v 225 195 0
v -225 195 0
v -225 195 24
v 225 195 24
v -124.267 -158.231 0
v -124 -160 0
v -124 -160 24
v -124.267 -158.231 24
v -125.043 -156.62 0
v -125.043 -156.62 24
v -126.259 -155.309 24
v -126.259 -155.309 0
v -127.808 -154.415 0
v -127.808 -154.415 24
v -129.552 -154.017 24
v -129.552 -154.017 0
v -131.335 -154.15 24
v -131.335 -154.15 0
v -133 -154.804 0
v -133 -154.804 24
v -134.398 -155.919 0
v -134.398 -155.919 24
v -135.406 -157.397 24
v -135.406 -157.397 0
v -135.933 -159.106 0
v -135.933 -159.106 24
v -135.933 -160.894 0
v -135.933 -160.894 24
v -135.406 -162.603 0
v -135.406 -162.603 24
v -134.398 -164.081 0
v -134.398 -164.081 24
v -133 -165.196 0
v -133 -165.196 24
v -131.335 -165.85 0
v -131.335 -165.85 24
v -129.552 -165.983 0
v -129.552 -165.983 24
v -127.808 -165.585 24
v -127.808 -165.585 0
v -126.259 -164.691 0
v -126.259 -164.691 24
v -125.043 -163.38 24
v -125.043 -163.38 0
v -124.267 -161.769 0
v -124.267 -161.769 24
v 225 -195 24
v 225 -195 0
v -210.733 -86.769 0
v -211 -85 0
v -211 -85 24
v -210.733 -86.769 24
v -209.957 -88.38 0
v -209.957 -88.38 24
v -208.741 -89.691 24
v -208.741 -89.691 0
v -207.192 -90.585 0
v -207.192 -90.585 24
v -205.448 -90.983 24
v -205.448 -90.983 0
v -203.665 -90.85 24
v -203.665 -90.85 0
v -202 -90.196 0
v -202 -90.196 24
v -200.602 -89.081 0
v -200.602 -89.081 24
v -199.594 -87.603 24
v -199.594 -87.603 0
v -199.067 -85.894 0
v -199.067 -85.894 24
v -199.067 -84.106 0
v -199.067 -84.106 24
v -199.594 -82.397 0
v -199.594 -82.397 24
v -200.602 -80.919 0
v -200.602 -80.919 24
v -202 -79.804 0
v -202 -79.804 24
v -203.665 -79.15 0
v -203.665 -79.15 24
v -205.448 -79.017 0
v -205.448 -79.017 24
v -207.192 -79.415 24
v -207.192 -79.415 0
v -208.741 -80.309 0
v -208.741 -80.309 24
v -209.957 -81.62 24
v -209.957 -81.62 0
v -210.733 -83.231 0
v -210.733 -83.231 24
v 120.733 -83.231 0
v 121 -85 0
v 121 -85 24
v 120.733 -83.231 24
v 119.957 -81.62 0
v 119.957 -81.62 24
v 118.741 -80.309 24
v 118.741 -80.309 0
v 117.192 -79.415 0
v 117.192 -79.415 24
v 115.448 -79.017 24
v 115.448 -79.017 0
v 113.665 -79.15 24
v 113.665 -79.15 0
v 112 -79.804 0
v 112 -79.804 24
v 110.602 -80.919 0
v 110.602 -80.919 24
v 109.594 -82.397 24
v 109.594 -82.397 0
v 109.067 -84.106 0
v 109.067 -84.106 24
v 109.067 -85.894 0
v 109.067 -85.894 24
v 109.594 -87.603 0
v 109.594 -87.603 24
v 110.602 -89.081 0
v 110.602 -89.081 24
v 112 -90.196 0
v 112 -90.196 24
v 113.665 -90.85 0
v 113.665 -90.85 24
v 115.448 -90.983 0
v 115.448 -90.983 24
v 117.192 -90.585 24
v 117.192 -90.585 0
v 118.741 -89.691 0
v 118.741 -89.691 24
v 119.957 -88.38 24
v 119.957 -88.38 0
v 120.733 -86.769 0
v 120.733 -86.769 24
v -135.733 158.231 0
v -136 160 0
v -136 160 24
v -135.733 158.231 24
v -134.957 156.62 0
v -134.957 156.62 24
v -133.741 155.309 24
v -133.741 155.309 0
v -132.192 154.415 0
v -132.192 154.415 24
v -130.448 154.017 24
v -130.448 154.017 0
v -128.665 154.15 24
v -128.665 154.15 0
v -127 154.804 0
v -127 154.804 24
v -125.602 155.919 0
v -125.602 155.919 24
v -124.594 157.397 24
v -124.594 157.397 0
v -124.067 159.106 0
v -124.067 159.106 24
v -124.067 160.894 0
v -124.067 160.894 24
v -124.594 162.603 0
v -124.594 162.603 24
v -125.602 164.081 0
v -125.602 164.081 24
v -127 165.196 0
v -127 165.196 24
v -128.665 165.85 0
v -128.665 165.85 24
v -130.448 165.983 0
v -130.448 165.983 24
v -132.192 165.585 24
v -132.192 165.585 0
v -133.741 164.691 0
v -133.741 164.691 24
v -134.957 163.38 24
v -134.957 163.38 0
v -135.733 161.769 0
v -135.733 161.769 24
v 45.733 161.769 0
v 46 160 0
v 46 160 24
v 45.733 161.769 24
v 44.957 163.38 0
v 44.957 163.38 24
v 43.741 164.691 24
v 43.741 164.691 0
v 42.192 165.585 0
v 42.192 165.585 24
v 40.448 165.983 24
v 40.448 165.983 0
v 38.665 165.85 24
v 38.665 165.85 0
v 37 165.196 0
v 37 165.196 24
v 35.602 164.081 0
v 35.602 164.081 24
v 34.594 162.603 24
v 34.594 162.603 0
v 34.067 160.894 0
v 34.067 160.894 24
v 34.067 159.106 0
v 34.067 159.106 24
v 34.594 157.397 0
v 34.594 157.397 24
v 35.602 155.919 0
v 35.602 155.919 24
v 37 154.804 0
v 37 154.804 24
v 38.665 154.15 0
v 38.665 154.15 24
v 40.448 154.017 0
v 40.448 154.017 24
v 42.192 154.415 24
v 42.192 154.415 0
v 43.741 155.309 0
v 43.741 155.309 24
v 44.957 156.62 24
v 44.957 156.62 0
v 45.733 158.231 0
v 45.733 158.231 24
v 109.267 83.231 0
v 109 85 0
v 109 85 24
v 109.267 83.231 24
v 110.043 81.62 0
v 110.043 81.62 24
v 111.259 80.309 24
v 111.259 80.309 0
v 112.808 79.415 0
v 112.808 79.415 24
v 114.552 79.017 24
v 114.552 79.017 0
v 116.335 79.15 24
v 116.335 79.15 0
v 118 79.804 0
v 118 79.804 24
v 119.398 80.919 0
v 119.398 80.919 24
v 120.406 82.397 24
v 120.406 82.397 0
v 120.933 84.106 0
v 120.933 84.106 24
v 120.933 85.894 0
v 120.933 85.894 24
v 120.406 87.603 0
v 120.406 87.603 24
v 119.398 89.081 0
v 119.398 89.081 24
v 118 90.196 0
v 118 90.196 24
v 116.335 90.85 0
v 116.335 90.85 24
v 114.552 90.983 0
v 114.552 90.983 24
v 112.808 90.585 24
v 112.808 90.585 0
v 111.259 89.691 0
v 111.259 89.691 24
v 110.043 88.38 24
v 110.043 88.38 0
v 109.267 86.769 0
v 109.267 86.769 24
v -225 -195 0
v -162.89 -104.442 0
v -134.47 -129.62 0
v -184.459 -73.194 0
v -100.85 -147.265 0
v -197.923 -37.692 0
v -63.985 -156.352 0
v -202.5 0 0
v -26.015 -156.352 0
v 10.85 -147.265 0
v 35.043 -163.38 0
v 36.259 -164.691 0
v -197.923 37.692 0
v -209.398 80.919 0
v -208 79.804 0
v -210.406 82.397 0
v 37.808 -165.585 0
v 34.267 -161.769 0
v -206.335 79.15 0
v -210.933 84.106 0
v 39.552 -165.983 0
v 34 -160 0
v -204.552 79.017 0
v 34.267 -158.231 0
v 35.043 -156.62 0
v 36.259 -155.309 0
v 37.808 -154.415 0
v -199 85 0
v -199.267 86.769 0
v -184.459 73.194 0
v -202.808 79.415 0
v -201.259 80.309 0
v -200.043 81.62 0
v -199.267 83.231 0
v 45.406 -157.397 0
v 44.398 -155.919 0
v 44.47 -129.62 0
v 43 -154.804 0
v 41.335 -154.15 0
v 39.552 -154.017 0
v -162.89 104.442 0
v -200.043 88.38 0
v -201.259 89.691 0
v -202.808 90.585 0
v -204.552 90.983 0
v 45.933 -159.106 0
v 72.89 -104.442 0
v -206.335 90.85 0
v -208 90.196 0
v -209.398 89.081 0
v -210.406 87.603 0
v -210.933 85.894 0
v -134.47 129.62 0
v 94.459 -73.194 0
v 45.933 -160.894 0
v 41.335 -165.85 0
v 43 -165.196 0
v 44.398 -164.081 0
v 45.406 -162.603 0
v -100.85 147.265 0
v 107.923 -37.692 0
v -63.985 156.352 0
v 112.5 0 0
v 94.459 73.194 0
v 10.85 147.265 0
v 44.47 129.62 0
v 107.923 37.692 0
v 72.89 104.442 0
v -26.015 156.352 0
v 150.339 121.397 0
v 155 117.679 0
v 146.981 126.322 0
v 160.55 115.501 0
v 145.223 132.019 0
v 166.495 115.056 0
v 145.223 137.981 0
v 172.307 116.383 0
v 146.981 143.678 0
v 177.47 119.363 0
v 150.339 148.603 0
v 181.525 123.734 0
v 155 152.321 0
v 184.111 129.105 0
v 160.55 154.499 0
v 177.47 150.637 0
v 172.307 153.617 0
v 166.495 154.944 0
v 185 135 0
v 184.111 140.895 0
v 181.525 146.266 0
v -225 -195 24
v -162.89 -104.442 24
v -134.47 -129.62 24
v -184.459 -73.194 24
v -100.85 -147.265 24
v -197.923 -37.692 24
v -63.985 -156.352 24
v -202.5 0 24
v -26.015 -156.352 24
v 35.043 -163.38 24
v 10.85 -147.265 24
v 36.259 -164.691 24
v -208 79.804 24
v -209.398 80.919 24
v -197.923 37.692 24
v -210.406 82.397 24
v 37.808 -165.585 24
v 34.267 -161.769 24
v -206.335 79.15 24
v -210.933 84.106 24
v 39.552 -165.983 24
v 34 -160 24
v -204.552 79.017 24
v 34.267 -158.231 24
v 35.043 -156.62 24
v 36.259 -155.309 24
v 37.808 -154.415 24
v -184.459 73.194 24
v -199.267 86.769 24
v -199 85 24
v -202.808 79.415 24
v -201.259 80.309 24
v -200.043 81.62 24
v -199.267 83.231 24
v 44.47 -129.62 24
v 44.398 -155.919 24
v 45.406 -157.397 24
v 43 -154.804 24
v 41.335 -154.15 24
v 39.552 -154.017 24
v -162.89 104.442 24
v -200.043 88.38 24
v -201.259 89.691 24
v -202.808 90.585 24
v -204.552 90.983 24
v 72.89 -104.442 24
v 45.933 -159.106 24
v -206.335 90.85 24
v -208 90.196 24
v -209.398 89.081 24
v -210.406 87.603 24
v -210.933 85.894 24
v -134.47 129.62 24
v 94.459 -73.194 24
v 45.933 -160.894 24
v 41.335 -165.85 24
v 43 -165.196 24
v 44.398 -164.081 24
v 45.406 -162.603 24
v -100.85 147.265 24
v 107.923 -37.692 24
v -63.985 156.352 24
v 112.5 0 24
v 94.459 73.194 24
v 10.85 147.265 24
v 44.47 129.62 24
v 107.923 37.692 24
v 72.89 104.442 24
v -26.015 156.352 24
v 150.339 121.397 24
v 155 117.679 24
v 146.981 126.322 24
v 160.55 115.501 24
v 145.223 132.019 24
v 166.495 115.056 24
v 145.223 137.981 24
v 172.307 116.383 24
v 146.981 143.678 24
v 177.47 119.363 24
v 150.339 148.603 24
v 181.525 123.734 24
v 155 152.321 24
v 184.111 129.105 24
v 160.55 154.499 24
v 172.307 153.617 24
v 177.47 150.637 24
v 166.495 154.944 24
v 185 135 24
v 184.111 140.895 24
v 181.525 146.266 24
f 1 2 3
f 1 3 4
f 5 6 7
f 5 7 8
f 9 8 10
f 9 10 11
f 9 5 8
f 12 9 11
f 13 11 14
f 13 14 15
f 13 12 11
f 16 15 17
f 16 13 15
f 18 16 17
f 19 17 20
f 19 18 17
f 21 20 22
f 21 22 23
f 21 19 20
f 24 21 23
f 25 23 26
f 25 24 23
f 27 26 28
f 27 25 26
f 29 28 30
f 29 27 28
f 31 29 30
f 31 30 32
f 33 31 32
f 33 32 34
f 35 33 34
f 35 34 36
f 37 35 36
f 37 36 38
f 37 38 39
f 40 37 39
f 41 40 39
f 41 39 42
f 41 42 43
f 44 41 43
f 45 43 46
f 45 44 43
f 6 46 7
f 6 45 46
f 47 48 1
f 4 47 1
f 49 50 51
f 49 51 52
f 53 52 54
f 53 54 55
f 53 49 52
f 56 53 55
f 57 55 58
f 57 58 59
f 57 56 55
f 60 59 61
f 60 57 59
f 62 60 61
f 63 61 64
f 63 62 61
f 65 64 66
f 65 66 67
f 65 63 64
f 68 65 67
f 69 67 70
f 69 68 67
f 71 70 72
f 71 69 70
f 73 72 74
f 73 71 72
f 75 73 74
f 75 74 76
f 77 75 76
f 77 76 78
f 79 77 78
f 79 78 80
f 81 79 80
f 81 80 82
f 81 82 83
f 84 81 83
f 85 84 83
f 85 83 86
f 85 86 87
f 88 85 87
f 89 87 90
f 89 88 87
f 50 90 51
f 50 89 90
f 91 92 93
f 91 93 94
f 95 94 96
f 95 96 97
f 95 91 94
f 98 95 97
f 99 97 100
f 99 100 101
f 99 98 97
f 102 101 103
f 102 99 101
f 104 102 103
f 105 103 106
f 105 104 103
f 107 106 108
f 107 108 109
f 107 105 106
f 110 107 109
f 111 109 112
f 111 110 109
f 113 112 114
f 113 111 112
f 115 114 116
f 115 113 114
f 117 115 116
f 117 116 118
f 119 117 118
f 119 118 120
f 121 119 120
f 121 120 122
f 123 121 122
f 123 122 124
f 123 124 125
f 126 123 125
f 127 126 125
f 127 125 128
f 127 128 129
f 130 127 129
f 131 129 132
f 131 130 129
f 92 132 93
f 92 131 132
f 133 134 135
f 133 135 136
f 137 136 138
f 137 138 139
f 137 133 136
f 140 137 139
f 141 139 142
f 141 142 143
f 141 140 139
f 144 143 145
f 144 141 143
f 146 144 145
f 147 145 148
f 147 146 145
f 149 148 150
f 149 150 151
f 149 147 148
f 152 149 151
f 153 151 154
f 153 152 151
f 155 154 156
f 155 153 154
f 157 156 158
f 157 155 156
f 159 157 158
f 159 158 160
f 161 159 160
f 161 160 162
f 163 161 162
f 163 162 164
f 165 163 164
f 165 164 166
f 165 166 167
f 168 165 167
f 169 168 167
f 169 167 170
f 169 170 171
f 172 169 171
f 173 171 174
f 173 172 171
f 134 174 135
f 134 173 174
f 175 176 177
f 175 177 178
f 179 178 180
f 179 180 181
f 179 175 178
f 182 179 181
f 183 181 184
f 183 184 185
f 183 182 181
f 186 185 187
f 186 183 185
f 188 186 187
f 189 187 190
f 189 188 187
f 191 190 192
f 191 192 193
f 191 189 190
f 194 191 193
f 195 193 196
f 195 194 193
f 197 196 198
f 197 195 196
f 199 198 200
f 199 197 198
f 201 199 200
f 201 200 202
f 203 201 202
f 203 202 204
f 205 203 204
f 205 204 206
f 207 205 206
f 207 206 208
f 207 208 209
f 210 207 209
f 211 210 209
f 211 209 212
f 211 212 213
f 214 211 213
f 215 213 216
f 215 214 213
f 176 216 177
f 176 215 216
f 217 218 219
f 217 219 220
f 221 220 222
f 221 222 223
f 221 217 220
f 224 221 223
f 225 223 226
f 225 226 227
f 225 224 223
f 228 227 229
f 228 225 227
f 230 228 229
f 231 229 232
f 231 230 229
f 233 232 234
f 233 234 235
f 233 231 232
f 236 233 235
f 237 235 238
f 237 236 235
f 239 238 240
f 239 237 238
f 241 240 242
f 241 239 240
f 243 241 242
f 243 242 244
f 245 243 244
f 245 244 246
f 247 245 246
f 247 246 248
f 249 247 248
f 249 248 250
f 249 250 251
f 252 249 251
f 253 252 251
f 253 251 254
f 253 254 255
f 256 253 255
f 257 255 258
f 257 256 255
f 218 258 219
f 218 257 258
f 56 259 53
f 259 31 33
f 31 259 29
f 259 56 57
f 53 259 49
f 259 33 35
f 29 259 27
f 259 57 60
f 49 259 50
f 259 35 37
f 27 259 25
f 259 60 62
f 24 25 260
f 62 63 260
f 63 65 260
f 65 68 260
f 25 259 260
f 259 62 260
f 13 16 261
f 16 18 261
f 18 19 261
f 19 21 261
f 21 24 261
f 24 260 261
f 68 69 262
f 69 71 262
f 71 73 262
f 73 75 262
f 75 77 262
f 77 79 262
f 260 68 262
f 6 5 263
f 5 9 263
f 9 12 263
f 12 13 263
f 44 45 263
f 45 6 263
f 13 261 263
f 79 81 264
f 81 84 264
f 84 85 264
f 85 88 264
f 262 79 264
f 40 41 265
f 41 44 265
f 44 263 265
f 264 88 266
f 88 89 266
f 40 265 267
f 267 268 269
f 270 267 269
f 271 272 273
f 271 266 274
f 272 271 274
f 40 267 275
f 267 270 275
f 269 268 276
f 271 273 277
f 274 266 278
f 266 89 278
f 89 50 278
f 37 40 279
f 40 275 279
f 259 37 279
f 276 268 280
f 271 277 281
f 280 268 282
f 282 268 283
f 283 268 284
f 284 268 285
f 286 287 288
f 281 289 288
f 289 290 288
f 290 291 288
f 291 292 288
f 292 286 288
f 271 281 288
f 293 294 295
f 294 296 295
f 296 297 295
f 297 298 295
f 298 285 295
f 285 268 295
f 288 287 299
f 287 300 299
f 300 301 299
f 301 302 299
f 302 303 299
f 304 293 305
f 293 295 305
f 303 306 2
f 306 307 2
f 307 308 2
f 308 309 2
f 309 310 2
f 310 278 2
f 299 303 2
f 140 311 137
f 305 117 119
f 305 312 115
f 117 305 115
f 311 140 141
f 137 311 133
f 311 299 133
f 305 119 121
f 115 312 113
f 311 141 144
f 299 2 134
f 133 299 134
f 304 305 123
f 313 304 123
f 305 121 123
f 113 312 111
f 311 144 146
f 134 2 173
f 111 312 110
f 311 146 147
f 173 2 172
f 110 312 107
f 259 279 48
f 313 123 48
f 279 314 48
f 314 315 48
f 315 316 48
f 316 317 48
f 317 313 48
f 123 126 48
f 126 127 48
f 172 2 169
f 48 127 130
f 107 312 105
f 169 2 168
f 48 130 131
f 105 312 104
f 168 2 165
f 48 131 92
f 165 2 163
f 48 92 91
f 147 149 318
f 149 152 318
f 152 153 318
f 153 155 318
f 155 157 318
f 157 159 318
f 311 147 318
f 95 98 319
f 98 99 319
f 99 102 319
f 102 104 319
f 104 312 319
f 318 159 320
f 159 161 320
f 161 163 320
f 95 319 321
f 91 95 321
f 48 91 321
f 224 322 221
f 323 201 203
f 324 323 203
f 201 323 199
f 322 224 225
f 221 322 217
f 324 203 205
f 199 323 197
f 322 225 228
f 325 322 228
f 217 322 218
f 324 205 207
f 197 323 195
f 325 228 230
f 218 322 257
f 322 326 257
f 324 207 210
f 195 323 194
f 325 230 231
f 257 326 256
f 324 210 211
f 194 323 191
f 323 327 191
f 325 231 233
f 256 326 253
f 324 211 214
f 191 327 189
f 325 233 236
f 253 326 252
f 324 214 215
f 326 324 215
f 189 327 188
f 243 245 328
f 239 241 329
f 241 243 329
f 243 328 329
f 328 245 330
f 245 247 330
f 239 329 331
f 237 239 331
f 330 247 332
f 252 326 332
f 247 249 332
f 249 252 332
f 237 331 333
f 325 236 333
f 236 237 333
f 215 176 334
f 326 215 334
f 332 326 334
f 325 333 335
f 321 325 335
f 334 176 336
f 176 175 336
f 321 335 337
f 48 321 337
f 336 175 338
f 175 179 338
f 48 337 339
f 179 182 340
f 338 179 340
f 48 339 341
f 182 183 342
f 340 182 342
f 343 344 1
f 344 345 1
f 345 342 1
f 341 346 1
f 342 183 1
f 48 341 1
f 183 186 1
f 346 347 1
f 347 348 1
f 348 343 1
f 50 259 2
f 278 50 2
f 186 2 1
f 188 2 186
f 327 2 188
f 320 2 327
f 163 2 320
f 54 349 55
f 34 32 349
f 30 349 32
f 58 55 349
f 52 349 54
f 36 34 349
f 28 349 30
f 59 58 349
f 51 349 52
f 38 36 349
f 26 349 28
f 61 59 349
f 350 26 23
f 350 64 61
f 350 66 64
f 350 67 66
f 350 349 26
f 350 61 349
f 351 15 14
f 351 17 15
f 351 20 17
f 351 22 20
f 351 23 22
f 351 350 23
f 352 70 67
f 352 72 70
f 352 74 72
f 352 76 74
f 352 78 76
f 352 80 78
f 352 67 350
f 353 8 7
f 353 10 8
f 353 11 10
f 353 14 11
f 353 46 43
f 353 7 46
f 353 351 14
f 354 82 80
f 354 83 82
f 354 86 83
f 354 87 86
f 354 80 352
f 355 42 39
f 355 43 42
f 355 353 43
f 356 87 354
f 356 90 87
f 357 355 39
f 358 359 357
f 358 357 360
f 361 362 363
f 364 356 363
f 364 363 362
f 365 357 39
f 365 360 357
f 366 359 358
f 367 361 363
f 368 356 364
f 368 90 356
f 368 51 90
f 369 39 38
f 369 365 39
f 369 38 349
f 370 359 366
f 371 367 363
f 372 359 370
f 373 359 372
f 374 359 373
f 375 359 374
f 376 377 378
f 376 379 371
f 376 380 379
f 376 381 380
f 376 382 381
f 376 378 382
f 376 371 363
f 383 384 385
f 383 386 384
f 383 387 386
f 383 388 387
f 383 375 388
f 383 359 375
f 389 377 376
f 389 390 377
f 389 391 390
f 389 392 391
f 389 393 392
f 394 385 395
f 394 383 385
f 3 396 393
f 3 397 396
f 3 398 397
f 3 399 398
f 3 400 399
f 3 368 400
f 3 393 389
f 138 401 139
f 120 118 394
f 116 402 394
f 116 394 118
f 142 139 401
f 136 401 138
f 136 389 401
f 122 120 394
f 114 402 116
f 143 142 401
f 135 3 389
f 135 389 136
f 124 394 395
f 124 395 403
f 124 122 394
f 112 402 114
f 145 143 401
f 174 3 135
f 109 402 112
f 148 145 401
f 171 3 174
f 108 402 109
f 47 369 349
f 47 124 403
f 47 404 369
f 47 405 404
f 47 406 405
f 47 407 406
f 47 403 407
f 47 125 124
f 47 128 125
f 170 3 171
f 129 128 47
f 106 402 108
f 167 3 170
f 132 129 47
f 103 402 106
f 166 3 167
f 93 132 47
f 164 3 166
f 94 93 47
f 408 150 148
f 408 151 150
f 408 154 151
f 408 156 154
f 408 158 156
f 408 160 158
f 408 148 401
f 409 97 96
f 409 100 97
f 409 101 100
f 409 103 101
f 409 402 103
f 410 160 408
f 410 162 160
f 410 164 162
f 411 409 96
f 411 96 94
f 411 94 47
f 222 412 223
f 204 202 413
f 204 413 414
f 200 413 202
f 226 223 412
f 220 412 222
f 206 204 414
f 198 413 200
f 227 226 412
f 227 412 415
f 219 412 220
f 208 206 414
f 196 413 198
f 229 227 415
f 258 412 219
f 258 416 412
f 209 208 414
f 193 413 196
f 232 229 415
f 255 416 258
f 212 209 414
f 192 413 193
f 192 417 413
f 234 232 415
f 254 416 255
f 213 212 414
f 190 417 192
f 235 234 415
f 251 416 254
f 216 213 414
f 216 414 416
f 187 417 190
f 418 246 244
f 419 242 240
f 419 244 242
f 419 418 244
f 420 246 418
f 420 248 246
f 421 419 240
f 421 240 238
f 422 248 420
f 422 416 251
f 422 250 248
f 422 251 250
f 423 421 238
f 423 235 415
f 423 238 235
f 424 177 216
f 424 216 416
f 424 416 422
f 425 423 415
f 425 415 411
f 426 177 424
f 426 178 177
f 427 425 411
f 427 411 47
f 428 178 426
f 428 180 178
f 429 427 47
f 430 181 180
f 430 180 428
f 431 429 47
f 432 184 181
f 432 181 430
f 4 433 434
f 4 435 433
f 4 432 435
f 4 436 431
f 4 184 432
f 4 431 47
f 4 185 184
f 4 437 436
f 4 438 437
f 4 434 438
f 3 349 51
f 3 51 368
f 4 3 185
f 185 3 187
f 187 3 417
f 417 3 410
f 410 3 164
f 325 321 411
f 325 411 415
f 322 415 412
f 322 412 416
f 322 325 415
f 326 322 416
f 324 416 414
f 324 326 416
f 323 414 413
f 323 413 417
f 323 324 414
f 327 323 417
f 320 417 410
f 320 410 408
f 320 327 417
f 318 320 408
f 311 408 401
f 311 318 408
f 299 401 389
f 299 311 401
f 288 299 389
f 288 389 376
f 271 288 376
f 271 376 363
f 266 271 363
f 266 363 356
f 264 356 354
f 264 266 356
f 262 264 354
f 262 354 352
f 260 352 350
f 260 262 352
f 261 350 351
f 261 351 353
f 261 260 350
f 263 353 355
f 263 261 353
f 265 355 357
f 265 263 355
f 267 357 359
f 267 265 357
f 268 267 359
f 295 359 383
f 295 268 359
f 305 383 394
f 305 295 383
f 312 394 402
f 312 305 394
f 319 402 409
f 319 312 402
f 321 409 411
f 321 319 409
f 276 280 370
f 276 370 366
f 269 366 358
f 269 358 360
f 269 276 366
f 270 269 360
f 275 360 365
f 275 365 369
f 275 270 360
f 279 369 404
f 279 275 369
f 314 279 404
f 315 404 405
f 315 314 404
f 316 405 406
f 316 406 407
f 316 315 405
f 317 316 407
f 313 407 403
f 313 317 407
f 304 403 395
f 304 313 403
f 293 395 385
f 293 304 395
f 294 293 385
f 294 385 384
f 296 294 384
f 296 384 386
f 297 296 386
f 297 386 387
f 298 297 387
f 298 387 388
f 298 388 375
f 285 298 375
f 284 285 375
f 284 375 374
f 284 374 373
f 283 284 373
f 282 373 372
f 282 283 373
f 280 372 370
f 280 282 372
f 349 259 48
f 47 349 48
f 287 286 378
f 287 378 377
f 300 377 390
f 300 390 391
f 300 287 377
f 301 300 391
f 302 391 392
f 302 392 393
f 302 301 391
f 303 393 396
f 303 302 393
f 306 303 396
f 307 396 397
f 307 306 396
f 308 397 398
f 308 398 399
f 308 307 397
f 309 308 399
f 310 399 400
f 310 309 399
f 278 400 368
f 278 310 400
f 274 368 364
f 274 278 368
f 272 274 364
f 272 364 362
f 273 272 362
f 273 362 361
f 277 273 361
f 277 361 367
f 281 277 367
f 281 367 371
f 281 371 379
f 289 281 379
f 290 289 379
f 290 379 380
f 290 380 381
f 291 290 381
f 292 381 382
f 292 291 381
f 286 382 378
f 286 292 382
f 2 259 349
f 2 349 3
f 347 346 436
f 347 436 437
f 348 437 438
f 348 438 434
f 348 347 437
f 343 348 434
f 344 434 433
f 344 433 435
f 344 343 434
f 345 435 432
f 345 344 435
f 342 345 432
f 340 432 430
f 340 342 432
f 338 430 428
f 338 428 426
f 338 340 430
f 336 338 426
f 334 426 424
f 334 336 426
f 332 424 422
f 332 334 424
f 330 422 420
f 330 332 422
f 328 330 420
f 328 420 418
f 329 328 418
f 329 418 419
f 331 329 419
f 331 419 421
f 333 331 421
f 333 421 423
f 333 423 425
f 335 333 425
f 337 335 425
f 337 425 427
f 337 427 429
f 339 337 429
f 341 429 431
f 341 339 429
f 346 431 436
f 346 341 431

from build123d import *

# Parameters (mm, degrees)
SKETCH_1_W      = 450
SKETCH_1_H      = 390
SKETCH_1_R      = 157.5
SKETCH_1_R_2    = 6
SKETCH_1_R_3    = 20
EXTRUDE_1_DEPTH = 24


with BuildPart() as part:
    # 草图1 → 凸台-拉伸1 (new body)
    with BuildSketch(Plane.XY):
        Rectangle(SKETCH_1_W, SKETCH_1_H)
        with Locations((-45, 0)):
            Circle(SKETCH_1_R, mode=Mode.SUBTRACT)
        with Locations((-205, 85)):
            Circle(SKETCH_1_R_2, mode=Mode.SUBTRACT)
        with Locations(Location((-205, -85, 0), (0, 0, 180))):
            Circle(SKETCH_1_R_2, mode=Mode.SUBTRACT)
        with Locations((40, 160)):
            Circle(SKETCH_1_R_2, mode=Mode.SUBTRACT)
        with Locations(Location((-130, 160, 0), (0, 0, 180))):
            Circle(SKETCH_1_R_2, mode=Mode.SUBTRACT)
        with Locations((115, -85)):
            Circle(SKETCH_1_R_2, mode=Mode.SUBTRACT)
        with Locations(Location((115, 85, 0), (0, 0, 180))):
            Circle(SKETCH_1_R_2, mode=Mode.SUBTRACT)
        with Locations((-130, -160)):
            Circle(SKETCH_1_R_2, mode=Mode.SUBTRACT)
        with Locations(Location((40, -160, 0), (0, 0, 180))):
            Circle(SKETCH_1_R_2, mode=Mode.SUBTRACT)
        with Locations((165, 135)):
            Circle(SKETCH_1_R_3, mode=Mode.SUBTRACT)
    extrude(amount=EXTRUDE_1_DEPTH)


solid = part.part
